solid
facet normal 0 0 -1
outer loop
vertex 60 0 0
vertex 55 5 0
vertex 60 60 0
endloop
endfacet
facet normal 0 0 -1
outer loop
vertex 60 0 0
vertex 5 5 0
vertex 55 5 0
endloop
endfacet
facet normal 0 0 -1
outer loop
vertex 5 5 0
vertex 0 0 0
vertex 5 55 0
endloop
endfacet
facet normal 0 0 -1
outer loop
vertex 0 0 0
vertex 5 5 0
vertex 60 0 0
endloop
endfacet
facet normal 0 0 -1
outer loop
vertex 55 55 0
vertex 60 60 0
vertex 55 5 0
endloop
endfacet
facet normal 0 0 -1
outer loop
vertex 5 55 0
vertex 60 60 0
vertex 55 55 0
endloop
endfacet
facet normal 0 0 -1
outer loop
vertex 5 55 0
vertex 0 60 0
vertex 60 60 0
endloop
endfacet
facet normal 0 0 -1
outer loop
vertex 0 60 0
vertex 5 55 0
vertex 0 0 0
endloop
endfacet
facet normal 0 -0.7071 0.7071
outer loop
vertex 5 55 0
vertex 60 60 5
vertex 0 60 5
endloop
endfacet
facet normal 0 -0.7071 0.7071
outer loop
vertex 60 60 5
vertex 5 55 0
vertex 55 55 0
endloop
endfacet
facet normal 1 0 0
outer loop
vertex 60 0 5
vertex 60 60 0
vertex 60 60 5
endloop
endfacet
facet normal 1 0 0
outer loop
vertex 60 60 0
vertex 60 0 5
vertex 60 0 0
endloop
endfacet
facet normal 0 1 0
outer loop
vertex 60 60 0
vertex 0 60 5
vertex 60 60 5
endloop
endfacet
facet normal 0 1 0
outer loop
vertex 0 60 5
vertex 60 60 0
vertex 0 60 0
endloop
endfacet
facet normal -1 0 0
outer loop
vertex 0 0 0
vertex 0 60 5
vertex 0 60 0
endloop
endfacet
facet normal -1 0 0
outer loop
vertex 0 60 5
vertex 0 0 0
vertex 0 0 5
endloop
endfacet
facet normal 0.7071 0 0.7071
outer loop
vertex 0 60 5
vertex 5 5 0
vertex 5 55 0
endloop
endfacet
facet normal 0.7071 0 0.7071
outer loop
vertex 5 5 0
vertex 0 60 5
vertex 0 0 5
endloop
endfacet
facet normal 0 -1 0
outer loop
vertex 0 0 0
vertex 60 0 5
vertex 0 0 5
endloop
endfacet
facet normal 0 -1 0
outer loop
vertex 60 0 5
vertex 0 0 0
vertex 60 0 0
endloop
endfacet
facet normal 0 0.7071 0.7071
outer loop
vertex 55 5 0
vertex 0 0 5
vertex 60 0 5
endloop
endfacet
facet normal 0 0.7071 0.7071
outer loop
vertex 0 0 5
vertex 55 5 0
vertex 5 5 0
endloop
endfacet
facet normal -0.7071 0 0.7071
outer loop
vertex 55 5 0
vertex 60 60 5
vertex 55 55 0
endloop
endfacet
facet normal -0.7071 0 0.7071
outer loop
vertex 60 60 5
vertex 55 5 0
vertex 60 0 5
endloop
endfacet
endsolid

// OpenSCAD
// file: ../wiki-yoinks/prism.scad
module prism(l, w, h) {
    // from wiki
    // https://en.wikibooks.org/wiki/OpenSCAD_User_Manual/Primitive_Solids#polyhedron
    polyhedron(points =
                   [
                       [ 0, 0, 0 ], [ l, 0, 0 ], [ l, w, 0 ], [ 0, w, 0 ],
                       [ 0, w, h ], [ l, w, h ]
                   ],
               faces = [
                   [ 0, 1, 2, 3 ], [ 5, 4, 3, 2 ], [ 0, 4, 5, 1 ], [ 0, 3, 4 ],
                   [ 5, 2, 1 ]
               ]);
}
// file: config.scad
$fn = 60;

grid_size = 60;
grid_height = 5;

grid_x=2;
grid_y=2;


box_height = 68;
// main file
include <config.scad>
use <../wiki-yoinks/prism.scad>

module GridSquare(grid_size, grid_height) {
    color([ 99 / 255, 30 / 255, 30 / 255 ]) {
        translate([ 0, grid_size - grid_height, 0 ]) {
            prism(grid_size, grid_height, grid_height);
        }
        translate([ grid_height, 0, 0 ]) {
            rotate([ 0, 0, 90 ]) { prism(grid_size, grid_height, grid_height); }
        }
        translate([ grid_size, grid_height, 0 ]) {
            rotate([ 0, 0, 180 ]) { prism(grid_size, grid_height, grid_height); }
        }
        translate([
            grid_size - grid_height,
            grid_size,
        ]) {
            rotate([ 0, 0, 270 ]) { prism(grid_size, grid_height, grid_height); }
        }
    }
}

GridSquare(grid_size, grid_height);
